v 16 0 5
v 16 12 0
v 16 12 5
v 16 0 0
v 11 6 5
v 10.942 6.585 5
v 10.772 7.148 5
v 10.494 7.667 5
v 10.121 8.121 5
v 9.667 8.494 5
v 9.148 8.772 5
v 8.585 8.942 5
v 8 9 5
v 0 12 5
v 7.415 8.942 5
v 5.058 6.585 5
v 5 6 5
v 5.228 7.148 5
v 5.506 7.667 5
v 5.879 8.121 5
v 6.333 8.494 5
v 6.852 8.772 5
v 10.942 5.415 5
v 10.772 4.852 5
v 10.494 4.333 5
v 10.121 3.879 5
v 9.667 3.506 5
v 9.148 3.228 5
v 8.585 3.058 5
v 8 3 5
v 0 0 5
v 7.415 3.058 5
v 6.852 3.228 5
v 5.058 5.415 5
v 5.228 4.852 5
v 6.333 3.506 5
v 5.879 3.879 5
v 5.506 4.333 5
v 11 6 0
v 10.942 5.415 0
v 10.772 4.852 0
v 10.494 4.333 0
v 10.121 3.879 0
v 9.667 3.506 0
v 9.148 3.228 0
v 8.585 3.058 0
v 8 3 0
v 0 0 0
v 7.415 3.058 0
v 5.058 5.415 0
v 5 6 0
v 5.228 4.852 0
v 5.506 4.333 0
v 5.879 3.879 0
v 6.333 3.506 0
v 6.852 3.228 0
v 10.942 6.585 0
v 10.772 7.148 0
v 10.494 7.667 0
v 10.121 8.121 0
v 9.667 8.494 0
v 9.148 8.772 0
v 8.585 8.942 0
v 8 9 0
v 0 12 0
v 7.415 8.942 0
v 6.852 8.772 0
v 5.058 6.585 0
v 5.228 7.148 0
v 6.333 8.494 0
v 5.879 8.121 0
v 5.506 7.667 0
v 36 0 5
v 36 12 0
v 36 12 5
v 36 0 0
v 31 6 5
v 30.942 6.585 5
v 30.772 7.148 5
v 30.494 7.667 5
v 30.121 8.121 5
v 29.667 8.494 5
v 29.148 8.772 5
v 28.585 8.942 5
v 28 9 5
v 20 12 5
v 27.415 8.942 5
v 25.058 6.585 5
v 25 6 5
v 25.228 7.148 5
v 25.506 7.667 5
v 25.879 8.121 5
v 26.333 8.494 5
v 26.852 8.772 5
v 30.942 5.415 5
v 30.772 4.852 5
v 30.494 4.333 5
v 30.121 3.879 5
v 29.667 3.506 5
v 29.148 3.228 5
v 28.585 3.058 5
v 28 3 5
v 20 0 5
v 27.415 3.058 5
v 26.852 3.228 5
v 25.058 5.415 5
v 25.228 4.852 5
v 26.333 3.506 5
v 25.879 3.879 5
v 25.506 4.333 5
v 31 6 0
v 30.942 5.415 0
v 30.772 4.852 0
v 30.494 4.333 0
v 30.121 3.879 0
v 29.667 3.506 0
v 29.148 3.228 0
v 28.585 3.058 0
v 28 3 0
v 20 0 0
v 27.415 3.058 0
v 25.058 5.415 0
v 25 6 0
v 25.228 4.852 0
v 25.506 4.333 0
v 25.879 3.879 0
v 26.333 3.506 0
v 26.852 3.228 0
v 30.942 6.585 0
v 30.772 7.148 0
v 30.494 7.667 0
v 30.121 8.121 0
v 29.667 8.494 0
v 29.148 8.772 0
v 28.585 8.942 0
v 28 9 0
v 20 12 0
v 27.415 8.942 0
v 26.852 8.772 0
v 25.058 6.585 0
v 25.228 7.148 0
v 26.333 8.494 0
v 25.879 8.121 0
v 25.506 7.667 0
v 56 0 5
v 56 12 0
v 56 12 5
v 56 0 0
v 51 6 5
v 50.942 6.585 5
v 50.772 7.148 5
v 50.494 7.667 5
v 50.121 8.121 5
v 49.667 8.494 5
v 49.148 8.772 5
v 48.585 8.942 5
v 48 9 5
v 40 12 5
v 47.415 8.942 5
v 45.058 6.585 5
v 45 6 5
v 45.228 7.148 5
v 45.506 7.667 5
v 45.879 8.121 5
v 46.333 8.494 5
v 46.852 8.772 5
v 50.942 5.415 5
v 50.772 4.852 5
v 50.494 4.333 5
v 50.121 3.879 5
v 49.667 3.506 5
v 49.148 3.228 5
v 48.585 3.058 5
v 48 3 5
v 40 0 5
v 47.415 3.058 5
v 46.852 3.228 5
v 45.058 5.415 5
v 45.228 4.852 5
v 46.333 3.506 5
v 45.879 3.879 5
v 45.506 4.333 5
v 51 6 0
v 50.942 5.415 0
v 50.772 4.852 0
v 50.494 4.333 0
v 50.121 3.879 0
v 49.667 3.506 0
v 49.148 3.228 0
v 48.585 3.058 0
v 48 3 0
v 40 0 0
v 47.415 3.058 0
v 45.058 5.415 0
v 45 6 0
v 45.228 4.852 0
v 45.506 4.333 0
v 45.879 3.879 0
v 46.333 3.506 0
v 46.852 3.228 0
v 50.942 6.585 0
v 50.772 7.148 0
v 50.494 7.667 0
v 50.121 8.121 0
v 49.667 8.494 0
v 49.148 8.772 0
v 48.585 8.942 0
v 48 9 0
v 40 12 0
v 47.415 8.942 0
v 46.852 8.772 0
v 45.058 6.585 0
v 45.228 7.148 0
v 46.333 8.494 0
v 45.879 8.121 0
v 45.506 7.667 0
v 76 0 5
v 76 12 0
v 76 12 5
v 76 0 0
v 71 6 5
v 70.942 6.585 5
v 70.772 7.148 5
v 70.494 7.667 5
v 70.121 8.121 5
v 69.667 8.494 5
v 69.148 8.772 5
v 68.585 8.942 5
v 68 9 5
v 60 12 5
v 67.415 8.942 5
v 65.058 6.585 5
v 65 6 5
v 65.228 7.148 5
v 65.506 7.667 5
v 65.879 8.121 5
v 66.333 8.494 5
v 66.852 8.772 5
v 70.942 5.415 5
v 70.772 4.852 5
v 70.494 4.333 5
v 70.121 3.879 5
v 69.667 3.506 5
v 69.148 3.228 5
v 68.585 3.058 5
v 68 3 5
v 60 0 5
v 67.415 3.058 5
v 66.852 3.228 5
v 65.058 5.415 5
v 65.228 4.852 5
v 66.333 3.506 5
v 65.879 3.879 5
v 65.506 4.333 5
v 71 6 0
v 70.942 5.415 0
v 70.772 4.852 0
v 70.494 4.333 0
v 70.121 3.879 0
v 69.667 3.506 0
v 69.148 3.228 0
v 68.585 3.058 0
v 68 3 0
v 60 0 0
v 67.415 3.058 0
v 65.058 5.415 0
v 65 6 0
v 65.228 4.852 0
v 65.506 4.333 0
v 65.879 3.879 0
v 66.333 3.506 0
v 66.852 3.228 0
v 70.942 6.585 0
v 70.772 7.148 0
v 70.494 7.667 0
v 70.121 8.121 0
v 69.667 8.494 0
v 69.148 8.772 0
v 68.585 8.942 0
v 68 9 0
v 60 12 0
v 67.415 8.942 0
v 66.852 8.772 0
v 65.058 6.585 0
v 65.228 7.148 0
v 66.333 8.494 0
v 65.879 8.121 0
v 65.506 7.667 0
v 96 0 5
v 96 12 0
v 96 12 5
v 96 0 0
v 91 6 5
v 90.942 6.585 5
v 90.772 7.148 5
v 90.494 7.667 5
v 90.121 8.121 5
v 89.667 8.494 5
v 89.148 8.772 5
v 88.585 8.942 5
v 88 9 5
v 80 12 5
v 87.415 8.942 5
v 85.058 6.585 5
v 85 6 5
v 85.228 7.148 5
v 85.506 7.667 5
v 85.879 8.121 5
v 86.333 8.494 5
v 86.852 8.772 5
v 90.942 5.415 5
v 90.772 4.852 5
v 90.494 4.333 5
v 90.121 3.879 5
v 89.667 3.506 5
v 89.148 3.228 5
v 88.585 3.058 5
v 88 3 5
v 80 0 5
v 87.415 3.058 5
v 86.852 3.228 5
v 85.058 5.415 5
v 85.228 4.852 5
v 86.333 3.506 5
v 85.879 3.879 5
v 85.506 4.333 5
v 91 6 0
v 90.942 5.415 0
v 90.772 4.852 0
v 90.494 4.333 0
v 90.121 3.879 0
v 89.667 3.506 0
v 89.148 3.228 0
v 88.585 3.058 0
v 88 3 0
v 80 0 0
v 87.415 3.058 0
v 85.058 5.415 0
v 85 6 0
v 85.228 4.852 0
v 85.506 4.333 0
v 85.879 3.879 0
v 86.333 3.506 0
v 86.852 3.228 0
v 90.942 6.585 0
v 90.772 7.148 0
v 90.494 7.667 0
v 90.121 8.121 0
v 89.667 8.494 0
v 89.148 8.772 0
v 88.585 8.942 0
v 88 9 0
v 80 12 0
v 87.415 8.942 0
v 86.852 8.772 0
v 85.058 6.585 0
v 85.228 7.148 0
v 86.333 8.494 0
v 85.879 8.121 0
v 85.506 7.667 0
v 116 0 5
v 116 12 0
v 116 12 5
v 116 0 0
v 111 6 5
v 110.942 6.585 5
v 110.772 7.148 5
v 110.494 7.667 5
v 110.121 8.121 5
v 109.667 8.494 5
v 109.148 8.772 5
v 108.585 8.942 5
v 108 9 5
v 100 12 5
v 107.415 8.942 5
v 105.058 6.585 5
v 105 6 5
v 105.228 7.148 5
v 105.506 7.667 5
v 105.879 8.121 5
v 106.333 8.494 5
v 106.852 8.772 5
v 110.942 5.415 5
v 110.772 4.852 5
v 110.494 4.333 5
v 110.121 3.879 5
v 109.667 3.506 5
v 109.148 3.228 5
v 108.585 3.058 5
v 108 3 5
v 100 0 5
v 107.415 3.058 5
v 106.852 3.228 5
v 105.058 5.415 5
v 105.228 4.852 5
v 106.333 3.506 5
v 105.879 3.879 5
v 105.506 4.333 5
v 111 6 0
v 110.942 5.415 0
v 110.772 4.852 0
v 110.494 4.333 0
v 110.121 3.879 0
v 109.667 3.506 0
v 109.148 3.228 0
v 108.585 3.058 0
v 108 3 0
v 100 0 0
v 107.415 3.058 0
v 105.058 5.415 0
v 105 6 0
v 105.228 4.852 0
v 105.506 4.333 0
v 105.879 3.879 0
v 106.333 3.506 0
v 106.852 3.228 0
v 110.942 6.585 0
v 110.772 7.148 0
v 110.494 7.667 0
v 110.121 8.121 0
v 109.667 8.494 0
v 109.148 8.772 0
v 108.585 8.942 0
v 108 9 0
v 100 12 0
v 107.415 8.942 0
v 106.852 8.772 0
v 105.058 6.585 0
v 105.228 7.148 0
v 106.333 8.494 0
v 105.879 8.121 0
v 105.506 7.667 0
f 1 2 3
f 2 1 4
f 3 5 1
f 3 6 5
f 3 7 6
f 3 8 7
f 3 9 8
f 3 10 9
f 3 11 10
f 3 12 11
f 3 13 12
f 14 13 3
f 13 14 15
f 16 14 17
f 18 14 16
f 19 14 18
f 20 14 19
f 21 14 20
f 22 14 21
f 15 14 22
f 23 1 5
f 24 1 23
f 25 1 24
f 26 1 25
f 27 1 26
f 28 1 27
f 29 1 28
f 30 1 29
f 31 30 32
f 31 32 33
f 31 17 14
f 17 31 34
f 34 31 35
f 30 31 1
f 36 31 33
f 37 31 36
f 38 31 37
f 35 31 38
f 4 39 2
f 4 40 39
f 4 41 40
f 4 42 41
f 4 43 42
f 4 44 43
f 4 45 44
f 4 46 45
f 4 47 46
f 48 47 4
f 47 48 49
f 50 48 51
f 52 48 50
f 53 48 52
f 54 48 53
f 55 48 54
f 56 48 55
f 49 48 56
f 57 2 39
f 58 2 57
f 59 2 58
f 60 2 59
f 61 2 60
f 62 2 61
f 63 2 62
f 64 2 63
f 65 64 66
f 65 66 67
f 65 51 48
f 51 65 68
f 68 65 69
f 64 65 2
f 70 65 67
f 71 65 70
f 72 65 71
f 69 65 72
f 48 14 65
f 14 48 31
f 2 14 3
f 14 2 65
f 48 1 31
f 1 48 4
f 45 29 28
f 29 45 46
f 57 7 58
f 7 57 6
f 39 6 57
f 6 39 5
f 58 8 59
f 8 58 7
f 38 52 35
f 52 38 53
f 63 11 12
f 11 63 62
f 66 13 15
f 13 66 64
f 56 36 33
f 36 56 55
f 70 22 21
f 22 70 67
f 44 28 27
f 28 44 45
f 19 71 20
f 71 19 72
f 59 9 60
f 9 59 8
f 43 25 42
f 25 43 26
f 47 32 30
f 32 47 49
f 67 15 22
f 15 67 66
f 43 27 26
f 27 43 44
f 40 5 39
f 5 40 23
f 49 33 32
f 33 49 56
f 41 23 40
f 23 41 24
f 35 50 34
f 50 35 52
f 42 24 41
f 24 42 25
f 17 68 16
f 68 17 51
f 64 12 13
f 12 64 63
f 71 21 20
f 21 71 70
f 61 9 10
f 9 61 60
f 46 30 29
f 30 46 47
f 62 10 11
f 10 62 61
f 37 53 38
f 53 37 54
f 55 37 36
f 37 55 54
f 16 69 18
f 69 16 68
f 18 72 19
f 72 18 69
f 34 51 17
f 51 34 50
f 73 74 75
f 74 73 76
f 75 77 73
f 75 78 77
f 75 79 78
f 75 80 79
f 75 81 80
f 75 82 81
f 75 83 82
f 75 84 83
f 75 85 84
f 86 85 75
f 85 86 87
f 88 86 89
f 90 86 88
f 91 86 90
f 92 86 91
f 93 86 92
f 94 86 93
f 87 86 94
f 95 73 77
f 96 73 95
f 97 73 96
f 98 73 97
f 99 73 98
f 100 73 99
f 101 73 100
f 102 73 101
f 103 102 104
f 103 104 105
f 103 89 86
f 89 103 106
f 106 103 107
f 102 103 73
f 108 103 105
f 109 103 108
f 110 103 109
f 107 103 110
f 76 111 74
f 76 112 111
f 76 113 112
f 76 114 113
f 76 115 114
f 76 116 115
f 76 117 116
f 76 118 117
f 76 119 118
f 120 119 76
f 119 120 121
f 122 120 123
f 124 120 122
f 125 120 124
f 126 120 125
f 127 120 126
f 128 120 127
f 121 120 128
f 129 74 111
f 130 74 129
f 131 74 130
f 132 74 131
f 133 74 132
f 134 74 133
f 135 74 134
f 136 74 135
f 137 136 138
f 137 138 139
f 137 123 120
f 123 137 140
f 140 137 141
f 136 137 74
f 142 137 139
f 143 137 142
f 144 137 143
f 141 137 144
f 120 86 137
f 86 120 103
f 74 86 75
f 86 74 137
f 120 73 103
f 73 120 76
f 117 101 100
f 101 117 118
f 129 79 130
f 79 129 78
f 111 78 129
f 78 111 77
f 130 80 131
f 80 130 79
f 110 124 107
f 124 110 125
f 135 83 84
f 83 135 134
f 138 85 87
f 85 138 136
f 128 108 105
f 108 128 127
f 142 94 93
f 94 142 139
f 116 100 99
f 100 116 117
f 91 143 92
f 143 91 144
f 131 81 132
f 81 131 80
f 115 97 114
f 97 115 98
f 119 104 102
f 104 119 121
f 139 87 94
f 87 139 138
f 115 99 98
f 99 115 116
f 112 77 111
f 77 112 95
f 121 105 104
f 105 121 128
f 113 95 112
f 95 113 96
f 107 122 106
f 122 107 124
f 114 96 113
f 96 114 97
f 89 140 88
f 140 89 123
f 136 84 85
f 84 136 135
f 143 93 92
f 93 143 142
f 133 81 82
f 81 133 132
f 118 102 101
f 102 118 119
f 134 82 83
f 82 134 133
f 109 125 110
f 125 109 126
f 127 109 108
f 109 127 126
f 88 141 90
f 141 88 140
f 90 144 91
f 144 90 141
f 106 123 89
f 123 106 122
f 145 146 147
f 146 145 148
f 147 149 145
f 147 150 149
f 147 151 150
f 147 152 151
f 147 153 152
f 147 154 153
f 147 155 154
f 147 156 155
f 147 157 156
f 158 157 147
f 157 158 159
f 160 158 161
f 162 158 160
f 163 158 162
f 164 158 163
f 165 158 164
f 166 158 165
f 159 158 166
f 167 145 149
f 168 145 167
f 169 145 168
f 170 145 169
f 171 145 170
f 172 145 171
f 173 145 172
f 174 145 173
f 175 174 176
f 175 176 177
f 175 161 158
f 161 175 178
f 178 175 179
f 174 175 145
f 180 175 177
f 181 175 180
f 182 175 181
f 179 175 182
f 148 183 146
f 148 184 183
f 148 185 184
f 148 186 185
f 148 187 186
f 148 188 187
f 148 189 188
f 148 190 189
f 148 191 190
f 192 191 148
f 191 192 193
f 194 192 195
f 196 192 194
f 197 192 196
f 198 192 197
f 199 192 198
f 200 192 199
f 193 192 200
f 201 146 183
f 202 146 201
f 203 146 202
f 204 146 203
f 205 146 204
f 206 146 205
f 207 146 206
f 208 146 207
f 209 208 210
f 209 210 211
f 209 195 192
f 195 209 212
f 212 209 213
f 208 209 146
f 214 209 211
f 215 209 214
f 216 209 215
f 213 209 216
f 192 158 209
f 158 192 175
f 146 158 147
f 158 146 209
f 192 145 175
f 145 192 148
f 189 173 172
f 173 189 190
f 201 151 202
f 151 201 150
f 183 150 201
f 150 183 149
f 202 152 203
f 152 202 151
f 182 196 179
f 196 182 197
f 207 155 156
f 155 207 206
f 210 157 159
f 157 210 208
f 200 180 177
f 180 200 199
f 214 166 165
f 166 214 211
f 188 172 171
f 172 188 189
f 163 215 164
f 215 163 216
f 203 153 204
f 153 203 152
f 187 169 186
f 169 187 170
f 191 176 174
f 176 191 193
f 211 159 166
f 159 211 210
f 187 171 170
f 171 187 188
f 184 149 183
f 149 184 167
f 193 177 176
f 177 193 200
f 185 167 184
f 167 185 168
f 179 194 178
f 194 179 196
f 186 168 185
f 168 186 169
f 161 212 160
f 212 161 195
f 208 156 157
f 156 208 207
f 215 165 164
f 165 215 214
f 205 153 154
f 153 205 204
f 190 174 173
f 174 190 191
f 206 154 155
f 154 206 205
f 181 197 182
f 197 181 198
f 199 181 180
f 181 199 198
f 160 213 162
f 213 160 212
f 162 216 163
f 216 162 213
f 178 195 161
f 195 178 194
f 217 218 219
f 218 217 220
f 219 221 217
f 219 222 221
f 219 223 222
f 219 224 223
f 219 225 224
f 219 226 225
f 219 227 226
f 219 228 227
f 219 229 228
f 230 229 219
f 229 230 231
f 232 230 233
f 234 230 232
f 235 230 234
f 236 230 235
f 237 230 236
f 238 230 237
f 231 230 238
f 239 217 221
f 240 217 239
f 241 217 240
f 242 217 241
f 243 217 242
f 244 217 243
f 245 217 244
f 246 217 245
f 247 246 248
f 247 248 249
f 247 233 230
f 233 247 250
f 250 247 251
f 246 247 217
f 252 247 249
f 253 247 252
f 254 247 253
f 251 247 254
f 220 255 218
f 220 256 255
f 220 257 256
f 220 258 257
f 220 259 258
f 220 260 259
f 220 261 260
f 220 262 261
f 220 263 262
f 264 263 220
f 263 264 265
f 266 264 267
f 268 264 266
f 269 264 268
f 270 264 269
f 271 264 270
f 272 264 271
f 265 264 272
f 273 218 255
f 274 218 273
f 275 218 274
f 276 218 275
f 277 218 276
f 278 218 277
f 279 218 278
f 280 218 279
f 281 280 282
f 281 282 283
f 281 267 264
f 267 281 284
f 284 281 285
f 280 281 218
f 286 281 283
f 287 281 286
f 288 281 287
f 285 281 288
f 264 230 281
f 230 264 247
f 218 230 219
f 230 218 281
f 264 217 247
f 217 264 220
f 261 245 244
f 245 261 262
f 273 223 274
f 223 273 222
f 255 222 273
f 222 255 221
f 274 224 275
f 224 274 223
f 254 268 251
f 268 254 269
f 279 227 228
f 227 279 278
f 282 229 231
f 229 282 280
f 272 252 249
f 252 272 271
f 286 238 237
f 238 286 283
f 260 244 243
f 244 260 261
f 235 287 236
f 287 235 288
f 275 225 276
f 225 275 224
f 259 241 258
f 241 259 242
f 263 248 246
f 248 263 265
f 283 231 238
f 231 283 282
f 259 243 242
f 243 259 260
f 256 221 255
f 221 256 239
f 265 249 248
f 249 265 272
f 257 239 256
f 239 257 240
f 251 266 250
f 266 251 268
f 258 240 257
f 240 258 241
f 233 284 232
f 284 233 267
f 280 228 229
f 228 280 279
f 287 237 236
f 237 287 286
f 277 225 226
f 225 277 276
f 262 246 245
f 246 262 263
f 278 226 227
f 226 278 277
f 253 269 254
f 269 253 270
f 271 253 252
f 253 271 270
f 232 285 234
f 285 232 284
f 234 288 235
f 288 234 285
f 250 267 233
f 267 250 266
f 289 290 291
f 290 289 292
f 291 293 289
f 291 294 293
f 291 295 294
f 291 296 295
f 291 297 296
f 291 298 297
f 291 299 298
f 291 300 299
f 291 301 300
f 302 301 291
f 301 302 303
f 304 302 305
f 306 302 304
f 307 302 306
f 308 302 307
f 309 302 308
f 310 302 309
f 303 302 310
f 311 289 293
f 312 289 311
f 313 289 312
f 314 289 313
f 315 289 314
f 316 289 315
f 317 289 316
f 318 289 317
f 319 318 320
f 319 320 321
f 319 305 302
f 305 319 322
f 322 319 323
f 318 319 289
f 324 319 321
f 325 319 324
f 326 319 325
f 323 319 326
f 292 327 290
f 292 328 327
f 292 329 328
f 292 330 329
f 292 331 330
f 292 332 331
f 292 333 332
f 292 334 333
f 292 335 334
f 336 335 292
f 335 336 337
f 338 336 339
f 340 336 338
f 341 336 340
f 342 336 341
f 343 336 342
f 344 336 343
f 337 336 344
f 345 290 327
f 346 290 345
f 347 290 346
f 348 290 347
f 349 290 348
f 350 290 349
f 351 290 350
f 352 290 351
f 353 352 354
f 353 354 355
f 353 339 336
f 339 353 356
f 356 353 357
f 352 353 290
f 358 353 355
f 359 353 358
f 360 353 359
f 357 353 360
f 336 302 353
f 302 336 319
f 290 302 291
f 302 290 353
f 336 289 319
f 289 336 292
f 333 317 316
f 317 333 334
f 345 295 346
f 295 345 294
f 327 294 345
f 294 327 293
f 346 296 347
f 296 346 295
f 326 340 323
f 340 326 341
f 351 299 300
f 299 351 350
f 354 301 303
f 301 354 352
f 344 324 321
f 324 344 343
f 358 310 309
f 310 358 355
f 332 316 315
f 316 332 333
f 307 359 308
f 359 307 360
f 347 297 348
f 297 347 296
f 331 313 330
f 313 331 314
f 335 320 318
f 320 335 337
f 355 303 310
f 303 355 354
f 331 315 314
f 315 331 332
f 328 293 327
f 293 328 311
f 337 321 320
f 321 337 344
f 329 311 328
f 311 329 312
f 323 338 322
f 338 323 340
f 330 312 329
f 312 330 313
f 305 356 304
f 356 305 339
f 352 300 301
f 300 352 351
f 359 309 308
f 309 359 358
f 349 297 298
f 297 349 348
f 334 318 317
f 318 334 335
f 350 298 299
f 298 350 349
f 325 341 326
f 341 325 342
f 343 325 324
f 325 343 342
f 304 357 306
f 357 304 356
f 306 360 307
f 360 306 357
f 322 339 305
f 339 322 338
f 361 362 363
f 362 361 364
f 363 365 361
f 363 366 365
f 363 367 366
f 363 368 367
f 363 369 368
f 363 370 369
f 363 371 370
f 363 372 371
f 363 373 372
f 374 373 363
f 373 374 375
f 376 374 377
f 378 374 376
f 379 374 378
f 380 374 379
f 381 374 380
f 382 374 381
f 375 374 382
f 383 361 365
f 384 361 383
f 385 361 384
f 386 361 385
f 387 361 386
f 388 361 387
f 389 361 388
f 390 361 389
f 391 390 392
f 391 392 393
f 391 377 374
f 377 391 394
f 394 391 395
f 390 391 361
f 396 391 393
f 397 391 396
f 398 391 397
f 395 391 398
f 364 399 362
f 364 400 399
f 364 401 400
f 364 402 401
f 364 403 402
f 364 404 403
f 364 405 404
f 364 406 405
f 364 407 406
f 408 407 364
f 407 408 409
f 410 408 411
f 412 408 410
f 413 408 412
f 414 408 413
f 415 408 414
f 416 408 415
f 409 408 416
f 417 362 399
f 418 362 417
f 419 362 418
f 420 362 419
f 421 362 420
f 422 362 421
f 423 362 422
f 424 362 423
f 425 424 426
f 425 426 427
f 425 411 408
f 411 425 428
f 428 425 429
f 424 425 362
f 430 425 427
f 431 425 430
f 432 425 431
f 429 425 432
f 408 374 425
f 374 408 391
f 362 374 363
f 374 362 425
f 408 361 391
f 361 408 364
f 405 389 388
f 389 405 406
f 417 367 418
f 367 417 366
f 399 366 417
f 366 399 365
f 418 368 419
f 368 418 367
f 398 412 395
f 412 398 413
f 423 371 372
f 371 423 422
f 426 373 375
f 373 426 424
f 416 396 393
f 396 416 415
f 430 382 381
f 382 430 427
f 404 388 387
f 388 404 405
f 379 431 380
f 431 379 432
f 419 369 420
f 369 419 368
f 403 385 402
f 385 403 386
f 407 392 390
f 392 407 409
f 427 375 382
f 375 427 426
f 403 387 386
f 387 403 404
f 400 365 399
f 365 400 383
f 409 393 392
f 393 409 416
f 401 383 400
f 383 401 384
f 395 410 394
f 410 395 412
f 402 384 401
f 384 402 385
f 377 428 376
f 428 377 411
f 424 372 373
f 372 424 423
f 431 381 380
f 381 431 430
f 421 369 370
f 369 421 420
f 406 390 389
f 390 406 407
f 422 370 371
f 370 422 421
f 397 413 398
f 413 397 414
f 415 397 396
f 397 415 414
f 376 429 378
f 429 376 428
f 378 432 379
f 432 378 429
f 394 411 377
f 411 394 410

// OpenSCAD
module tile(){difference(){cube([16,12,5]);translate([8,6,-1]) cylinder(h=7,r=3,$fn=32);}}
for(i=[0:5]) translate([i*20,0,0]) tile();
